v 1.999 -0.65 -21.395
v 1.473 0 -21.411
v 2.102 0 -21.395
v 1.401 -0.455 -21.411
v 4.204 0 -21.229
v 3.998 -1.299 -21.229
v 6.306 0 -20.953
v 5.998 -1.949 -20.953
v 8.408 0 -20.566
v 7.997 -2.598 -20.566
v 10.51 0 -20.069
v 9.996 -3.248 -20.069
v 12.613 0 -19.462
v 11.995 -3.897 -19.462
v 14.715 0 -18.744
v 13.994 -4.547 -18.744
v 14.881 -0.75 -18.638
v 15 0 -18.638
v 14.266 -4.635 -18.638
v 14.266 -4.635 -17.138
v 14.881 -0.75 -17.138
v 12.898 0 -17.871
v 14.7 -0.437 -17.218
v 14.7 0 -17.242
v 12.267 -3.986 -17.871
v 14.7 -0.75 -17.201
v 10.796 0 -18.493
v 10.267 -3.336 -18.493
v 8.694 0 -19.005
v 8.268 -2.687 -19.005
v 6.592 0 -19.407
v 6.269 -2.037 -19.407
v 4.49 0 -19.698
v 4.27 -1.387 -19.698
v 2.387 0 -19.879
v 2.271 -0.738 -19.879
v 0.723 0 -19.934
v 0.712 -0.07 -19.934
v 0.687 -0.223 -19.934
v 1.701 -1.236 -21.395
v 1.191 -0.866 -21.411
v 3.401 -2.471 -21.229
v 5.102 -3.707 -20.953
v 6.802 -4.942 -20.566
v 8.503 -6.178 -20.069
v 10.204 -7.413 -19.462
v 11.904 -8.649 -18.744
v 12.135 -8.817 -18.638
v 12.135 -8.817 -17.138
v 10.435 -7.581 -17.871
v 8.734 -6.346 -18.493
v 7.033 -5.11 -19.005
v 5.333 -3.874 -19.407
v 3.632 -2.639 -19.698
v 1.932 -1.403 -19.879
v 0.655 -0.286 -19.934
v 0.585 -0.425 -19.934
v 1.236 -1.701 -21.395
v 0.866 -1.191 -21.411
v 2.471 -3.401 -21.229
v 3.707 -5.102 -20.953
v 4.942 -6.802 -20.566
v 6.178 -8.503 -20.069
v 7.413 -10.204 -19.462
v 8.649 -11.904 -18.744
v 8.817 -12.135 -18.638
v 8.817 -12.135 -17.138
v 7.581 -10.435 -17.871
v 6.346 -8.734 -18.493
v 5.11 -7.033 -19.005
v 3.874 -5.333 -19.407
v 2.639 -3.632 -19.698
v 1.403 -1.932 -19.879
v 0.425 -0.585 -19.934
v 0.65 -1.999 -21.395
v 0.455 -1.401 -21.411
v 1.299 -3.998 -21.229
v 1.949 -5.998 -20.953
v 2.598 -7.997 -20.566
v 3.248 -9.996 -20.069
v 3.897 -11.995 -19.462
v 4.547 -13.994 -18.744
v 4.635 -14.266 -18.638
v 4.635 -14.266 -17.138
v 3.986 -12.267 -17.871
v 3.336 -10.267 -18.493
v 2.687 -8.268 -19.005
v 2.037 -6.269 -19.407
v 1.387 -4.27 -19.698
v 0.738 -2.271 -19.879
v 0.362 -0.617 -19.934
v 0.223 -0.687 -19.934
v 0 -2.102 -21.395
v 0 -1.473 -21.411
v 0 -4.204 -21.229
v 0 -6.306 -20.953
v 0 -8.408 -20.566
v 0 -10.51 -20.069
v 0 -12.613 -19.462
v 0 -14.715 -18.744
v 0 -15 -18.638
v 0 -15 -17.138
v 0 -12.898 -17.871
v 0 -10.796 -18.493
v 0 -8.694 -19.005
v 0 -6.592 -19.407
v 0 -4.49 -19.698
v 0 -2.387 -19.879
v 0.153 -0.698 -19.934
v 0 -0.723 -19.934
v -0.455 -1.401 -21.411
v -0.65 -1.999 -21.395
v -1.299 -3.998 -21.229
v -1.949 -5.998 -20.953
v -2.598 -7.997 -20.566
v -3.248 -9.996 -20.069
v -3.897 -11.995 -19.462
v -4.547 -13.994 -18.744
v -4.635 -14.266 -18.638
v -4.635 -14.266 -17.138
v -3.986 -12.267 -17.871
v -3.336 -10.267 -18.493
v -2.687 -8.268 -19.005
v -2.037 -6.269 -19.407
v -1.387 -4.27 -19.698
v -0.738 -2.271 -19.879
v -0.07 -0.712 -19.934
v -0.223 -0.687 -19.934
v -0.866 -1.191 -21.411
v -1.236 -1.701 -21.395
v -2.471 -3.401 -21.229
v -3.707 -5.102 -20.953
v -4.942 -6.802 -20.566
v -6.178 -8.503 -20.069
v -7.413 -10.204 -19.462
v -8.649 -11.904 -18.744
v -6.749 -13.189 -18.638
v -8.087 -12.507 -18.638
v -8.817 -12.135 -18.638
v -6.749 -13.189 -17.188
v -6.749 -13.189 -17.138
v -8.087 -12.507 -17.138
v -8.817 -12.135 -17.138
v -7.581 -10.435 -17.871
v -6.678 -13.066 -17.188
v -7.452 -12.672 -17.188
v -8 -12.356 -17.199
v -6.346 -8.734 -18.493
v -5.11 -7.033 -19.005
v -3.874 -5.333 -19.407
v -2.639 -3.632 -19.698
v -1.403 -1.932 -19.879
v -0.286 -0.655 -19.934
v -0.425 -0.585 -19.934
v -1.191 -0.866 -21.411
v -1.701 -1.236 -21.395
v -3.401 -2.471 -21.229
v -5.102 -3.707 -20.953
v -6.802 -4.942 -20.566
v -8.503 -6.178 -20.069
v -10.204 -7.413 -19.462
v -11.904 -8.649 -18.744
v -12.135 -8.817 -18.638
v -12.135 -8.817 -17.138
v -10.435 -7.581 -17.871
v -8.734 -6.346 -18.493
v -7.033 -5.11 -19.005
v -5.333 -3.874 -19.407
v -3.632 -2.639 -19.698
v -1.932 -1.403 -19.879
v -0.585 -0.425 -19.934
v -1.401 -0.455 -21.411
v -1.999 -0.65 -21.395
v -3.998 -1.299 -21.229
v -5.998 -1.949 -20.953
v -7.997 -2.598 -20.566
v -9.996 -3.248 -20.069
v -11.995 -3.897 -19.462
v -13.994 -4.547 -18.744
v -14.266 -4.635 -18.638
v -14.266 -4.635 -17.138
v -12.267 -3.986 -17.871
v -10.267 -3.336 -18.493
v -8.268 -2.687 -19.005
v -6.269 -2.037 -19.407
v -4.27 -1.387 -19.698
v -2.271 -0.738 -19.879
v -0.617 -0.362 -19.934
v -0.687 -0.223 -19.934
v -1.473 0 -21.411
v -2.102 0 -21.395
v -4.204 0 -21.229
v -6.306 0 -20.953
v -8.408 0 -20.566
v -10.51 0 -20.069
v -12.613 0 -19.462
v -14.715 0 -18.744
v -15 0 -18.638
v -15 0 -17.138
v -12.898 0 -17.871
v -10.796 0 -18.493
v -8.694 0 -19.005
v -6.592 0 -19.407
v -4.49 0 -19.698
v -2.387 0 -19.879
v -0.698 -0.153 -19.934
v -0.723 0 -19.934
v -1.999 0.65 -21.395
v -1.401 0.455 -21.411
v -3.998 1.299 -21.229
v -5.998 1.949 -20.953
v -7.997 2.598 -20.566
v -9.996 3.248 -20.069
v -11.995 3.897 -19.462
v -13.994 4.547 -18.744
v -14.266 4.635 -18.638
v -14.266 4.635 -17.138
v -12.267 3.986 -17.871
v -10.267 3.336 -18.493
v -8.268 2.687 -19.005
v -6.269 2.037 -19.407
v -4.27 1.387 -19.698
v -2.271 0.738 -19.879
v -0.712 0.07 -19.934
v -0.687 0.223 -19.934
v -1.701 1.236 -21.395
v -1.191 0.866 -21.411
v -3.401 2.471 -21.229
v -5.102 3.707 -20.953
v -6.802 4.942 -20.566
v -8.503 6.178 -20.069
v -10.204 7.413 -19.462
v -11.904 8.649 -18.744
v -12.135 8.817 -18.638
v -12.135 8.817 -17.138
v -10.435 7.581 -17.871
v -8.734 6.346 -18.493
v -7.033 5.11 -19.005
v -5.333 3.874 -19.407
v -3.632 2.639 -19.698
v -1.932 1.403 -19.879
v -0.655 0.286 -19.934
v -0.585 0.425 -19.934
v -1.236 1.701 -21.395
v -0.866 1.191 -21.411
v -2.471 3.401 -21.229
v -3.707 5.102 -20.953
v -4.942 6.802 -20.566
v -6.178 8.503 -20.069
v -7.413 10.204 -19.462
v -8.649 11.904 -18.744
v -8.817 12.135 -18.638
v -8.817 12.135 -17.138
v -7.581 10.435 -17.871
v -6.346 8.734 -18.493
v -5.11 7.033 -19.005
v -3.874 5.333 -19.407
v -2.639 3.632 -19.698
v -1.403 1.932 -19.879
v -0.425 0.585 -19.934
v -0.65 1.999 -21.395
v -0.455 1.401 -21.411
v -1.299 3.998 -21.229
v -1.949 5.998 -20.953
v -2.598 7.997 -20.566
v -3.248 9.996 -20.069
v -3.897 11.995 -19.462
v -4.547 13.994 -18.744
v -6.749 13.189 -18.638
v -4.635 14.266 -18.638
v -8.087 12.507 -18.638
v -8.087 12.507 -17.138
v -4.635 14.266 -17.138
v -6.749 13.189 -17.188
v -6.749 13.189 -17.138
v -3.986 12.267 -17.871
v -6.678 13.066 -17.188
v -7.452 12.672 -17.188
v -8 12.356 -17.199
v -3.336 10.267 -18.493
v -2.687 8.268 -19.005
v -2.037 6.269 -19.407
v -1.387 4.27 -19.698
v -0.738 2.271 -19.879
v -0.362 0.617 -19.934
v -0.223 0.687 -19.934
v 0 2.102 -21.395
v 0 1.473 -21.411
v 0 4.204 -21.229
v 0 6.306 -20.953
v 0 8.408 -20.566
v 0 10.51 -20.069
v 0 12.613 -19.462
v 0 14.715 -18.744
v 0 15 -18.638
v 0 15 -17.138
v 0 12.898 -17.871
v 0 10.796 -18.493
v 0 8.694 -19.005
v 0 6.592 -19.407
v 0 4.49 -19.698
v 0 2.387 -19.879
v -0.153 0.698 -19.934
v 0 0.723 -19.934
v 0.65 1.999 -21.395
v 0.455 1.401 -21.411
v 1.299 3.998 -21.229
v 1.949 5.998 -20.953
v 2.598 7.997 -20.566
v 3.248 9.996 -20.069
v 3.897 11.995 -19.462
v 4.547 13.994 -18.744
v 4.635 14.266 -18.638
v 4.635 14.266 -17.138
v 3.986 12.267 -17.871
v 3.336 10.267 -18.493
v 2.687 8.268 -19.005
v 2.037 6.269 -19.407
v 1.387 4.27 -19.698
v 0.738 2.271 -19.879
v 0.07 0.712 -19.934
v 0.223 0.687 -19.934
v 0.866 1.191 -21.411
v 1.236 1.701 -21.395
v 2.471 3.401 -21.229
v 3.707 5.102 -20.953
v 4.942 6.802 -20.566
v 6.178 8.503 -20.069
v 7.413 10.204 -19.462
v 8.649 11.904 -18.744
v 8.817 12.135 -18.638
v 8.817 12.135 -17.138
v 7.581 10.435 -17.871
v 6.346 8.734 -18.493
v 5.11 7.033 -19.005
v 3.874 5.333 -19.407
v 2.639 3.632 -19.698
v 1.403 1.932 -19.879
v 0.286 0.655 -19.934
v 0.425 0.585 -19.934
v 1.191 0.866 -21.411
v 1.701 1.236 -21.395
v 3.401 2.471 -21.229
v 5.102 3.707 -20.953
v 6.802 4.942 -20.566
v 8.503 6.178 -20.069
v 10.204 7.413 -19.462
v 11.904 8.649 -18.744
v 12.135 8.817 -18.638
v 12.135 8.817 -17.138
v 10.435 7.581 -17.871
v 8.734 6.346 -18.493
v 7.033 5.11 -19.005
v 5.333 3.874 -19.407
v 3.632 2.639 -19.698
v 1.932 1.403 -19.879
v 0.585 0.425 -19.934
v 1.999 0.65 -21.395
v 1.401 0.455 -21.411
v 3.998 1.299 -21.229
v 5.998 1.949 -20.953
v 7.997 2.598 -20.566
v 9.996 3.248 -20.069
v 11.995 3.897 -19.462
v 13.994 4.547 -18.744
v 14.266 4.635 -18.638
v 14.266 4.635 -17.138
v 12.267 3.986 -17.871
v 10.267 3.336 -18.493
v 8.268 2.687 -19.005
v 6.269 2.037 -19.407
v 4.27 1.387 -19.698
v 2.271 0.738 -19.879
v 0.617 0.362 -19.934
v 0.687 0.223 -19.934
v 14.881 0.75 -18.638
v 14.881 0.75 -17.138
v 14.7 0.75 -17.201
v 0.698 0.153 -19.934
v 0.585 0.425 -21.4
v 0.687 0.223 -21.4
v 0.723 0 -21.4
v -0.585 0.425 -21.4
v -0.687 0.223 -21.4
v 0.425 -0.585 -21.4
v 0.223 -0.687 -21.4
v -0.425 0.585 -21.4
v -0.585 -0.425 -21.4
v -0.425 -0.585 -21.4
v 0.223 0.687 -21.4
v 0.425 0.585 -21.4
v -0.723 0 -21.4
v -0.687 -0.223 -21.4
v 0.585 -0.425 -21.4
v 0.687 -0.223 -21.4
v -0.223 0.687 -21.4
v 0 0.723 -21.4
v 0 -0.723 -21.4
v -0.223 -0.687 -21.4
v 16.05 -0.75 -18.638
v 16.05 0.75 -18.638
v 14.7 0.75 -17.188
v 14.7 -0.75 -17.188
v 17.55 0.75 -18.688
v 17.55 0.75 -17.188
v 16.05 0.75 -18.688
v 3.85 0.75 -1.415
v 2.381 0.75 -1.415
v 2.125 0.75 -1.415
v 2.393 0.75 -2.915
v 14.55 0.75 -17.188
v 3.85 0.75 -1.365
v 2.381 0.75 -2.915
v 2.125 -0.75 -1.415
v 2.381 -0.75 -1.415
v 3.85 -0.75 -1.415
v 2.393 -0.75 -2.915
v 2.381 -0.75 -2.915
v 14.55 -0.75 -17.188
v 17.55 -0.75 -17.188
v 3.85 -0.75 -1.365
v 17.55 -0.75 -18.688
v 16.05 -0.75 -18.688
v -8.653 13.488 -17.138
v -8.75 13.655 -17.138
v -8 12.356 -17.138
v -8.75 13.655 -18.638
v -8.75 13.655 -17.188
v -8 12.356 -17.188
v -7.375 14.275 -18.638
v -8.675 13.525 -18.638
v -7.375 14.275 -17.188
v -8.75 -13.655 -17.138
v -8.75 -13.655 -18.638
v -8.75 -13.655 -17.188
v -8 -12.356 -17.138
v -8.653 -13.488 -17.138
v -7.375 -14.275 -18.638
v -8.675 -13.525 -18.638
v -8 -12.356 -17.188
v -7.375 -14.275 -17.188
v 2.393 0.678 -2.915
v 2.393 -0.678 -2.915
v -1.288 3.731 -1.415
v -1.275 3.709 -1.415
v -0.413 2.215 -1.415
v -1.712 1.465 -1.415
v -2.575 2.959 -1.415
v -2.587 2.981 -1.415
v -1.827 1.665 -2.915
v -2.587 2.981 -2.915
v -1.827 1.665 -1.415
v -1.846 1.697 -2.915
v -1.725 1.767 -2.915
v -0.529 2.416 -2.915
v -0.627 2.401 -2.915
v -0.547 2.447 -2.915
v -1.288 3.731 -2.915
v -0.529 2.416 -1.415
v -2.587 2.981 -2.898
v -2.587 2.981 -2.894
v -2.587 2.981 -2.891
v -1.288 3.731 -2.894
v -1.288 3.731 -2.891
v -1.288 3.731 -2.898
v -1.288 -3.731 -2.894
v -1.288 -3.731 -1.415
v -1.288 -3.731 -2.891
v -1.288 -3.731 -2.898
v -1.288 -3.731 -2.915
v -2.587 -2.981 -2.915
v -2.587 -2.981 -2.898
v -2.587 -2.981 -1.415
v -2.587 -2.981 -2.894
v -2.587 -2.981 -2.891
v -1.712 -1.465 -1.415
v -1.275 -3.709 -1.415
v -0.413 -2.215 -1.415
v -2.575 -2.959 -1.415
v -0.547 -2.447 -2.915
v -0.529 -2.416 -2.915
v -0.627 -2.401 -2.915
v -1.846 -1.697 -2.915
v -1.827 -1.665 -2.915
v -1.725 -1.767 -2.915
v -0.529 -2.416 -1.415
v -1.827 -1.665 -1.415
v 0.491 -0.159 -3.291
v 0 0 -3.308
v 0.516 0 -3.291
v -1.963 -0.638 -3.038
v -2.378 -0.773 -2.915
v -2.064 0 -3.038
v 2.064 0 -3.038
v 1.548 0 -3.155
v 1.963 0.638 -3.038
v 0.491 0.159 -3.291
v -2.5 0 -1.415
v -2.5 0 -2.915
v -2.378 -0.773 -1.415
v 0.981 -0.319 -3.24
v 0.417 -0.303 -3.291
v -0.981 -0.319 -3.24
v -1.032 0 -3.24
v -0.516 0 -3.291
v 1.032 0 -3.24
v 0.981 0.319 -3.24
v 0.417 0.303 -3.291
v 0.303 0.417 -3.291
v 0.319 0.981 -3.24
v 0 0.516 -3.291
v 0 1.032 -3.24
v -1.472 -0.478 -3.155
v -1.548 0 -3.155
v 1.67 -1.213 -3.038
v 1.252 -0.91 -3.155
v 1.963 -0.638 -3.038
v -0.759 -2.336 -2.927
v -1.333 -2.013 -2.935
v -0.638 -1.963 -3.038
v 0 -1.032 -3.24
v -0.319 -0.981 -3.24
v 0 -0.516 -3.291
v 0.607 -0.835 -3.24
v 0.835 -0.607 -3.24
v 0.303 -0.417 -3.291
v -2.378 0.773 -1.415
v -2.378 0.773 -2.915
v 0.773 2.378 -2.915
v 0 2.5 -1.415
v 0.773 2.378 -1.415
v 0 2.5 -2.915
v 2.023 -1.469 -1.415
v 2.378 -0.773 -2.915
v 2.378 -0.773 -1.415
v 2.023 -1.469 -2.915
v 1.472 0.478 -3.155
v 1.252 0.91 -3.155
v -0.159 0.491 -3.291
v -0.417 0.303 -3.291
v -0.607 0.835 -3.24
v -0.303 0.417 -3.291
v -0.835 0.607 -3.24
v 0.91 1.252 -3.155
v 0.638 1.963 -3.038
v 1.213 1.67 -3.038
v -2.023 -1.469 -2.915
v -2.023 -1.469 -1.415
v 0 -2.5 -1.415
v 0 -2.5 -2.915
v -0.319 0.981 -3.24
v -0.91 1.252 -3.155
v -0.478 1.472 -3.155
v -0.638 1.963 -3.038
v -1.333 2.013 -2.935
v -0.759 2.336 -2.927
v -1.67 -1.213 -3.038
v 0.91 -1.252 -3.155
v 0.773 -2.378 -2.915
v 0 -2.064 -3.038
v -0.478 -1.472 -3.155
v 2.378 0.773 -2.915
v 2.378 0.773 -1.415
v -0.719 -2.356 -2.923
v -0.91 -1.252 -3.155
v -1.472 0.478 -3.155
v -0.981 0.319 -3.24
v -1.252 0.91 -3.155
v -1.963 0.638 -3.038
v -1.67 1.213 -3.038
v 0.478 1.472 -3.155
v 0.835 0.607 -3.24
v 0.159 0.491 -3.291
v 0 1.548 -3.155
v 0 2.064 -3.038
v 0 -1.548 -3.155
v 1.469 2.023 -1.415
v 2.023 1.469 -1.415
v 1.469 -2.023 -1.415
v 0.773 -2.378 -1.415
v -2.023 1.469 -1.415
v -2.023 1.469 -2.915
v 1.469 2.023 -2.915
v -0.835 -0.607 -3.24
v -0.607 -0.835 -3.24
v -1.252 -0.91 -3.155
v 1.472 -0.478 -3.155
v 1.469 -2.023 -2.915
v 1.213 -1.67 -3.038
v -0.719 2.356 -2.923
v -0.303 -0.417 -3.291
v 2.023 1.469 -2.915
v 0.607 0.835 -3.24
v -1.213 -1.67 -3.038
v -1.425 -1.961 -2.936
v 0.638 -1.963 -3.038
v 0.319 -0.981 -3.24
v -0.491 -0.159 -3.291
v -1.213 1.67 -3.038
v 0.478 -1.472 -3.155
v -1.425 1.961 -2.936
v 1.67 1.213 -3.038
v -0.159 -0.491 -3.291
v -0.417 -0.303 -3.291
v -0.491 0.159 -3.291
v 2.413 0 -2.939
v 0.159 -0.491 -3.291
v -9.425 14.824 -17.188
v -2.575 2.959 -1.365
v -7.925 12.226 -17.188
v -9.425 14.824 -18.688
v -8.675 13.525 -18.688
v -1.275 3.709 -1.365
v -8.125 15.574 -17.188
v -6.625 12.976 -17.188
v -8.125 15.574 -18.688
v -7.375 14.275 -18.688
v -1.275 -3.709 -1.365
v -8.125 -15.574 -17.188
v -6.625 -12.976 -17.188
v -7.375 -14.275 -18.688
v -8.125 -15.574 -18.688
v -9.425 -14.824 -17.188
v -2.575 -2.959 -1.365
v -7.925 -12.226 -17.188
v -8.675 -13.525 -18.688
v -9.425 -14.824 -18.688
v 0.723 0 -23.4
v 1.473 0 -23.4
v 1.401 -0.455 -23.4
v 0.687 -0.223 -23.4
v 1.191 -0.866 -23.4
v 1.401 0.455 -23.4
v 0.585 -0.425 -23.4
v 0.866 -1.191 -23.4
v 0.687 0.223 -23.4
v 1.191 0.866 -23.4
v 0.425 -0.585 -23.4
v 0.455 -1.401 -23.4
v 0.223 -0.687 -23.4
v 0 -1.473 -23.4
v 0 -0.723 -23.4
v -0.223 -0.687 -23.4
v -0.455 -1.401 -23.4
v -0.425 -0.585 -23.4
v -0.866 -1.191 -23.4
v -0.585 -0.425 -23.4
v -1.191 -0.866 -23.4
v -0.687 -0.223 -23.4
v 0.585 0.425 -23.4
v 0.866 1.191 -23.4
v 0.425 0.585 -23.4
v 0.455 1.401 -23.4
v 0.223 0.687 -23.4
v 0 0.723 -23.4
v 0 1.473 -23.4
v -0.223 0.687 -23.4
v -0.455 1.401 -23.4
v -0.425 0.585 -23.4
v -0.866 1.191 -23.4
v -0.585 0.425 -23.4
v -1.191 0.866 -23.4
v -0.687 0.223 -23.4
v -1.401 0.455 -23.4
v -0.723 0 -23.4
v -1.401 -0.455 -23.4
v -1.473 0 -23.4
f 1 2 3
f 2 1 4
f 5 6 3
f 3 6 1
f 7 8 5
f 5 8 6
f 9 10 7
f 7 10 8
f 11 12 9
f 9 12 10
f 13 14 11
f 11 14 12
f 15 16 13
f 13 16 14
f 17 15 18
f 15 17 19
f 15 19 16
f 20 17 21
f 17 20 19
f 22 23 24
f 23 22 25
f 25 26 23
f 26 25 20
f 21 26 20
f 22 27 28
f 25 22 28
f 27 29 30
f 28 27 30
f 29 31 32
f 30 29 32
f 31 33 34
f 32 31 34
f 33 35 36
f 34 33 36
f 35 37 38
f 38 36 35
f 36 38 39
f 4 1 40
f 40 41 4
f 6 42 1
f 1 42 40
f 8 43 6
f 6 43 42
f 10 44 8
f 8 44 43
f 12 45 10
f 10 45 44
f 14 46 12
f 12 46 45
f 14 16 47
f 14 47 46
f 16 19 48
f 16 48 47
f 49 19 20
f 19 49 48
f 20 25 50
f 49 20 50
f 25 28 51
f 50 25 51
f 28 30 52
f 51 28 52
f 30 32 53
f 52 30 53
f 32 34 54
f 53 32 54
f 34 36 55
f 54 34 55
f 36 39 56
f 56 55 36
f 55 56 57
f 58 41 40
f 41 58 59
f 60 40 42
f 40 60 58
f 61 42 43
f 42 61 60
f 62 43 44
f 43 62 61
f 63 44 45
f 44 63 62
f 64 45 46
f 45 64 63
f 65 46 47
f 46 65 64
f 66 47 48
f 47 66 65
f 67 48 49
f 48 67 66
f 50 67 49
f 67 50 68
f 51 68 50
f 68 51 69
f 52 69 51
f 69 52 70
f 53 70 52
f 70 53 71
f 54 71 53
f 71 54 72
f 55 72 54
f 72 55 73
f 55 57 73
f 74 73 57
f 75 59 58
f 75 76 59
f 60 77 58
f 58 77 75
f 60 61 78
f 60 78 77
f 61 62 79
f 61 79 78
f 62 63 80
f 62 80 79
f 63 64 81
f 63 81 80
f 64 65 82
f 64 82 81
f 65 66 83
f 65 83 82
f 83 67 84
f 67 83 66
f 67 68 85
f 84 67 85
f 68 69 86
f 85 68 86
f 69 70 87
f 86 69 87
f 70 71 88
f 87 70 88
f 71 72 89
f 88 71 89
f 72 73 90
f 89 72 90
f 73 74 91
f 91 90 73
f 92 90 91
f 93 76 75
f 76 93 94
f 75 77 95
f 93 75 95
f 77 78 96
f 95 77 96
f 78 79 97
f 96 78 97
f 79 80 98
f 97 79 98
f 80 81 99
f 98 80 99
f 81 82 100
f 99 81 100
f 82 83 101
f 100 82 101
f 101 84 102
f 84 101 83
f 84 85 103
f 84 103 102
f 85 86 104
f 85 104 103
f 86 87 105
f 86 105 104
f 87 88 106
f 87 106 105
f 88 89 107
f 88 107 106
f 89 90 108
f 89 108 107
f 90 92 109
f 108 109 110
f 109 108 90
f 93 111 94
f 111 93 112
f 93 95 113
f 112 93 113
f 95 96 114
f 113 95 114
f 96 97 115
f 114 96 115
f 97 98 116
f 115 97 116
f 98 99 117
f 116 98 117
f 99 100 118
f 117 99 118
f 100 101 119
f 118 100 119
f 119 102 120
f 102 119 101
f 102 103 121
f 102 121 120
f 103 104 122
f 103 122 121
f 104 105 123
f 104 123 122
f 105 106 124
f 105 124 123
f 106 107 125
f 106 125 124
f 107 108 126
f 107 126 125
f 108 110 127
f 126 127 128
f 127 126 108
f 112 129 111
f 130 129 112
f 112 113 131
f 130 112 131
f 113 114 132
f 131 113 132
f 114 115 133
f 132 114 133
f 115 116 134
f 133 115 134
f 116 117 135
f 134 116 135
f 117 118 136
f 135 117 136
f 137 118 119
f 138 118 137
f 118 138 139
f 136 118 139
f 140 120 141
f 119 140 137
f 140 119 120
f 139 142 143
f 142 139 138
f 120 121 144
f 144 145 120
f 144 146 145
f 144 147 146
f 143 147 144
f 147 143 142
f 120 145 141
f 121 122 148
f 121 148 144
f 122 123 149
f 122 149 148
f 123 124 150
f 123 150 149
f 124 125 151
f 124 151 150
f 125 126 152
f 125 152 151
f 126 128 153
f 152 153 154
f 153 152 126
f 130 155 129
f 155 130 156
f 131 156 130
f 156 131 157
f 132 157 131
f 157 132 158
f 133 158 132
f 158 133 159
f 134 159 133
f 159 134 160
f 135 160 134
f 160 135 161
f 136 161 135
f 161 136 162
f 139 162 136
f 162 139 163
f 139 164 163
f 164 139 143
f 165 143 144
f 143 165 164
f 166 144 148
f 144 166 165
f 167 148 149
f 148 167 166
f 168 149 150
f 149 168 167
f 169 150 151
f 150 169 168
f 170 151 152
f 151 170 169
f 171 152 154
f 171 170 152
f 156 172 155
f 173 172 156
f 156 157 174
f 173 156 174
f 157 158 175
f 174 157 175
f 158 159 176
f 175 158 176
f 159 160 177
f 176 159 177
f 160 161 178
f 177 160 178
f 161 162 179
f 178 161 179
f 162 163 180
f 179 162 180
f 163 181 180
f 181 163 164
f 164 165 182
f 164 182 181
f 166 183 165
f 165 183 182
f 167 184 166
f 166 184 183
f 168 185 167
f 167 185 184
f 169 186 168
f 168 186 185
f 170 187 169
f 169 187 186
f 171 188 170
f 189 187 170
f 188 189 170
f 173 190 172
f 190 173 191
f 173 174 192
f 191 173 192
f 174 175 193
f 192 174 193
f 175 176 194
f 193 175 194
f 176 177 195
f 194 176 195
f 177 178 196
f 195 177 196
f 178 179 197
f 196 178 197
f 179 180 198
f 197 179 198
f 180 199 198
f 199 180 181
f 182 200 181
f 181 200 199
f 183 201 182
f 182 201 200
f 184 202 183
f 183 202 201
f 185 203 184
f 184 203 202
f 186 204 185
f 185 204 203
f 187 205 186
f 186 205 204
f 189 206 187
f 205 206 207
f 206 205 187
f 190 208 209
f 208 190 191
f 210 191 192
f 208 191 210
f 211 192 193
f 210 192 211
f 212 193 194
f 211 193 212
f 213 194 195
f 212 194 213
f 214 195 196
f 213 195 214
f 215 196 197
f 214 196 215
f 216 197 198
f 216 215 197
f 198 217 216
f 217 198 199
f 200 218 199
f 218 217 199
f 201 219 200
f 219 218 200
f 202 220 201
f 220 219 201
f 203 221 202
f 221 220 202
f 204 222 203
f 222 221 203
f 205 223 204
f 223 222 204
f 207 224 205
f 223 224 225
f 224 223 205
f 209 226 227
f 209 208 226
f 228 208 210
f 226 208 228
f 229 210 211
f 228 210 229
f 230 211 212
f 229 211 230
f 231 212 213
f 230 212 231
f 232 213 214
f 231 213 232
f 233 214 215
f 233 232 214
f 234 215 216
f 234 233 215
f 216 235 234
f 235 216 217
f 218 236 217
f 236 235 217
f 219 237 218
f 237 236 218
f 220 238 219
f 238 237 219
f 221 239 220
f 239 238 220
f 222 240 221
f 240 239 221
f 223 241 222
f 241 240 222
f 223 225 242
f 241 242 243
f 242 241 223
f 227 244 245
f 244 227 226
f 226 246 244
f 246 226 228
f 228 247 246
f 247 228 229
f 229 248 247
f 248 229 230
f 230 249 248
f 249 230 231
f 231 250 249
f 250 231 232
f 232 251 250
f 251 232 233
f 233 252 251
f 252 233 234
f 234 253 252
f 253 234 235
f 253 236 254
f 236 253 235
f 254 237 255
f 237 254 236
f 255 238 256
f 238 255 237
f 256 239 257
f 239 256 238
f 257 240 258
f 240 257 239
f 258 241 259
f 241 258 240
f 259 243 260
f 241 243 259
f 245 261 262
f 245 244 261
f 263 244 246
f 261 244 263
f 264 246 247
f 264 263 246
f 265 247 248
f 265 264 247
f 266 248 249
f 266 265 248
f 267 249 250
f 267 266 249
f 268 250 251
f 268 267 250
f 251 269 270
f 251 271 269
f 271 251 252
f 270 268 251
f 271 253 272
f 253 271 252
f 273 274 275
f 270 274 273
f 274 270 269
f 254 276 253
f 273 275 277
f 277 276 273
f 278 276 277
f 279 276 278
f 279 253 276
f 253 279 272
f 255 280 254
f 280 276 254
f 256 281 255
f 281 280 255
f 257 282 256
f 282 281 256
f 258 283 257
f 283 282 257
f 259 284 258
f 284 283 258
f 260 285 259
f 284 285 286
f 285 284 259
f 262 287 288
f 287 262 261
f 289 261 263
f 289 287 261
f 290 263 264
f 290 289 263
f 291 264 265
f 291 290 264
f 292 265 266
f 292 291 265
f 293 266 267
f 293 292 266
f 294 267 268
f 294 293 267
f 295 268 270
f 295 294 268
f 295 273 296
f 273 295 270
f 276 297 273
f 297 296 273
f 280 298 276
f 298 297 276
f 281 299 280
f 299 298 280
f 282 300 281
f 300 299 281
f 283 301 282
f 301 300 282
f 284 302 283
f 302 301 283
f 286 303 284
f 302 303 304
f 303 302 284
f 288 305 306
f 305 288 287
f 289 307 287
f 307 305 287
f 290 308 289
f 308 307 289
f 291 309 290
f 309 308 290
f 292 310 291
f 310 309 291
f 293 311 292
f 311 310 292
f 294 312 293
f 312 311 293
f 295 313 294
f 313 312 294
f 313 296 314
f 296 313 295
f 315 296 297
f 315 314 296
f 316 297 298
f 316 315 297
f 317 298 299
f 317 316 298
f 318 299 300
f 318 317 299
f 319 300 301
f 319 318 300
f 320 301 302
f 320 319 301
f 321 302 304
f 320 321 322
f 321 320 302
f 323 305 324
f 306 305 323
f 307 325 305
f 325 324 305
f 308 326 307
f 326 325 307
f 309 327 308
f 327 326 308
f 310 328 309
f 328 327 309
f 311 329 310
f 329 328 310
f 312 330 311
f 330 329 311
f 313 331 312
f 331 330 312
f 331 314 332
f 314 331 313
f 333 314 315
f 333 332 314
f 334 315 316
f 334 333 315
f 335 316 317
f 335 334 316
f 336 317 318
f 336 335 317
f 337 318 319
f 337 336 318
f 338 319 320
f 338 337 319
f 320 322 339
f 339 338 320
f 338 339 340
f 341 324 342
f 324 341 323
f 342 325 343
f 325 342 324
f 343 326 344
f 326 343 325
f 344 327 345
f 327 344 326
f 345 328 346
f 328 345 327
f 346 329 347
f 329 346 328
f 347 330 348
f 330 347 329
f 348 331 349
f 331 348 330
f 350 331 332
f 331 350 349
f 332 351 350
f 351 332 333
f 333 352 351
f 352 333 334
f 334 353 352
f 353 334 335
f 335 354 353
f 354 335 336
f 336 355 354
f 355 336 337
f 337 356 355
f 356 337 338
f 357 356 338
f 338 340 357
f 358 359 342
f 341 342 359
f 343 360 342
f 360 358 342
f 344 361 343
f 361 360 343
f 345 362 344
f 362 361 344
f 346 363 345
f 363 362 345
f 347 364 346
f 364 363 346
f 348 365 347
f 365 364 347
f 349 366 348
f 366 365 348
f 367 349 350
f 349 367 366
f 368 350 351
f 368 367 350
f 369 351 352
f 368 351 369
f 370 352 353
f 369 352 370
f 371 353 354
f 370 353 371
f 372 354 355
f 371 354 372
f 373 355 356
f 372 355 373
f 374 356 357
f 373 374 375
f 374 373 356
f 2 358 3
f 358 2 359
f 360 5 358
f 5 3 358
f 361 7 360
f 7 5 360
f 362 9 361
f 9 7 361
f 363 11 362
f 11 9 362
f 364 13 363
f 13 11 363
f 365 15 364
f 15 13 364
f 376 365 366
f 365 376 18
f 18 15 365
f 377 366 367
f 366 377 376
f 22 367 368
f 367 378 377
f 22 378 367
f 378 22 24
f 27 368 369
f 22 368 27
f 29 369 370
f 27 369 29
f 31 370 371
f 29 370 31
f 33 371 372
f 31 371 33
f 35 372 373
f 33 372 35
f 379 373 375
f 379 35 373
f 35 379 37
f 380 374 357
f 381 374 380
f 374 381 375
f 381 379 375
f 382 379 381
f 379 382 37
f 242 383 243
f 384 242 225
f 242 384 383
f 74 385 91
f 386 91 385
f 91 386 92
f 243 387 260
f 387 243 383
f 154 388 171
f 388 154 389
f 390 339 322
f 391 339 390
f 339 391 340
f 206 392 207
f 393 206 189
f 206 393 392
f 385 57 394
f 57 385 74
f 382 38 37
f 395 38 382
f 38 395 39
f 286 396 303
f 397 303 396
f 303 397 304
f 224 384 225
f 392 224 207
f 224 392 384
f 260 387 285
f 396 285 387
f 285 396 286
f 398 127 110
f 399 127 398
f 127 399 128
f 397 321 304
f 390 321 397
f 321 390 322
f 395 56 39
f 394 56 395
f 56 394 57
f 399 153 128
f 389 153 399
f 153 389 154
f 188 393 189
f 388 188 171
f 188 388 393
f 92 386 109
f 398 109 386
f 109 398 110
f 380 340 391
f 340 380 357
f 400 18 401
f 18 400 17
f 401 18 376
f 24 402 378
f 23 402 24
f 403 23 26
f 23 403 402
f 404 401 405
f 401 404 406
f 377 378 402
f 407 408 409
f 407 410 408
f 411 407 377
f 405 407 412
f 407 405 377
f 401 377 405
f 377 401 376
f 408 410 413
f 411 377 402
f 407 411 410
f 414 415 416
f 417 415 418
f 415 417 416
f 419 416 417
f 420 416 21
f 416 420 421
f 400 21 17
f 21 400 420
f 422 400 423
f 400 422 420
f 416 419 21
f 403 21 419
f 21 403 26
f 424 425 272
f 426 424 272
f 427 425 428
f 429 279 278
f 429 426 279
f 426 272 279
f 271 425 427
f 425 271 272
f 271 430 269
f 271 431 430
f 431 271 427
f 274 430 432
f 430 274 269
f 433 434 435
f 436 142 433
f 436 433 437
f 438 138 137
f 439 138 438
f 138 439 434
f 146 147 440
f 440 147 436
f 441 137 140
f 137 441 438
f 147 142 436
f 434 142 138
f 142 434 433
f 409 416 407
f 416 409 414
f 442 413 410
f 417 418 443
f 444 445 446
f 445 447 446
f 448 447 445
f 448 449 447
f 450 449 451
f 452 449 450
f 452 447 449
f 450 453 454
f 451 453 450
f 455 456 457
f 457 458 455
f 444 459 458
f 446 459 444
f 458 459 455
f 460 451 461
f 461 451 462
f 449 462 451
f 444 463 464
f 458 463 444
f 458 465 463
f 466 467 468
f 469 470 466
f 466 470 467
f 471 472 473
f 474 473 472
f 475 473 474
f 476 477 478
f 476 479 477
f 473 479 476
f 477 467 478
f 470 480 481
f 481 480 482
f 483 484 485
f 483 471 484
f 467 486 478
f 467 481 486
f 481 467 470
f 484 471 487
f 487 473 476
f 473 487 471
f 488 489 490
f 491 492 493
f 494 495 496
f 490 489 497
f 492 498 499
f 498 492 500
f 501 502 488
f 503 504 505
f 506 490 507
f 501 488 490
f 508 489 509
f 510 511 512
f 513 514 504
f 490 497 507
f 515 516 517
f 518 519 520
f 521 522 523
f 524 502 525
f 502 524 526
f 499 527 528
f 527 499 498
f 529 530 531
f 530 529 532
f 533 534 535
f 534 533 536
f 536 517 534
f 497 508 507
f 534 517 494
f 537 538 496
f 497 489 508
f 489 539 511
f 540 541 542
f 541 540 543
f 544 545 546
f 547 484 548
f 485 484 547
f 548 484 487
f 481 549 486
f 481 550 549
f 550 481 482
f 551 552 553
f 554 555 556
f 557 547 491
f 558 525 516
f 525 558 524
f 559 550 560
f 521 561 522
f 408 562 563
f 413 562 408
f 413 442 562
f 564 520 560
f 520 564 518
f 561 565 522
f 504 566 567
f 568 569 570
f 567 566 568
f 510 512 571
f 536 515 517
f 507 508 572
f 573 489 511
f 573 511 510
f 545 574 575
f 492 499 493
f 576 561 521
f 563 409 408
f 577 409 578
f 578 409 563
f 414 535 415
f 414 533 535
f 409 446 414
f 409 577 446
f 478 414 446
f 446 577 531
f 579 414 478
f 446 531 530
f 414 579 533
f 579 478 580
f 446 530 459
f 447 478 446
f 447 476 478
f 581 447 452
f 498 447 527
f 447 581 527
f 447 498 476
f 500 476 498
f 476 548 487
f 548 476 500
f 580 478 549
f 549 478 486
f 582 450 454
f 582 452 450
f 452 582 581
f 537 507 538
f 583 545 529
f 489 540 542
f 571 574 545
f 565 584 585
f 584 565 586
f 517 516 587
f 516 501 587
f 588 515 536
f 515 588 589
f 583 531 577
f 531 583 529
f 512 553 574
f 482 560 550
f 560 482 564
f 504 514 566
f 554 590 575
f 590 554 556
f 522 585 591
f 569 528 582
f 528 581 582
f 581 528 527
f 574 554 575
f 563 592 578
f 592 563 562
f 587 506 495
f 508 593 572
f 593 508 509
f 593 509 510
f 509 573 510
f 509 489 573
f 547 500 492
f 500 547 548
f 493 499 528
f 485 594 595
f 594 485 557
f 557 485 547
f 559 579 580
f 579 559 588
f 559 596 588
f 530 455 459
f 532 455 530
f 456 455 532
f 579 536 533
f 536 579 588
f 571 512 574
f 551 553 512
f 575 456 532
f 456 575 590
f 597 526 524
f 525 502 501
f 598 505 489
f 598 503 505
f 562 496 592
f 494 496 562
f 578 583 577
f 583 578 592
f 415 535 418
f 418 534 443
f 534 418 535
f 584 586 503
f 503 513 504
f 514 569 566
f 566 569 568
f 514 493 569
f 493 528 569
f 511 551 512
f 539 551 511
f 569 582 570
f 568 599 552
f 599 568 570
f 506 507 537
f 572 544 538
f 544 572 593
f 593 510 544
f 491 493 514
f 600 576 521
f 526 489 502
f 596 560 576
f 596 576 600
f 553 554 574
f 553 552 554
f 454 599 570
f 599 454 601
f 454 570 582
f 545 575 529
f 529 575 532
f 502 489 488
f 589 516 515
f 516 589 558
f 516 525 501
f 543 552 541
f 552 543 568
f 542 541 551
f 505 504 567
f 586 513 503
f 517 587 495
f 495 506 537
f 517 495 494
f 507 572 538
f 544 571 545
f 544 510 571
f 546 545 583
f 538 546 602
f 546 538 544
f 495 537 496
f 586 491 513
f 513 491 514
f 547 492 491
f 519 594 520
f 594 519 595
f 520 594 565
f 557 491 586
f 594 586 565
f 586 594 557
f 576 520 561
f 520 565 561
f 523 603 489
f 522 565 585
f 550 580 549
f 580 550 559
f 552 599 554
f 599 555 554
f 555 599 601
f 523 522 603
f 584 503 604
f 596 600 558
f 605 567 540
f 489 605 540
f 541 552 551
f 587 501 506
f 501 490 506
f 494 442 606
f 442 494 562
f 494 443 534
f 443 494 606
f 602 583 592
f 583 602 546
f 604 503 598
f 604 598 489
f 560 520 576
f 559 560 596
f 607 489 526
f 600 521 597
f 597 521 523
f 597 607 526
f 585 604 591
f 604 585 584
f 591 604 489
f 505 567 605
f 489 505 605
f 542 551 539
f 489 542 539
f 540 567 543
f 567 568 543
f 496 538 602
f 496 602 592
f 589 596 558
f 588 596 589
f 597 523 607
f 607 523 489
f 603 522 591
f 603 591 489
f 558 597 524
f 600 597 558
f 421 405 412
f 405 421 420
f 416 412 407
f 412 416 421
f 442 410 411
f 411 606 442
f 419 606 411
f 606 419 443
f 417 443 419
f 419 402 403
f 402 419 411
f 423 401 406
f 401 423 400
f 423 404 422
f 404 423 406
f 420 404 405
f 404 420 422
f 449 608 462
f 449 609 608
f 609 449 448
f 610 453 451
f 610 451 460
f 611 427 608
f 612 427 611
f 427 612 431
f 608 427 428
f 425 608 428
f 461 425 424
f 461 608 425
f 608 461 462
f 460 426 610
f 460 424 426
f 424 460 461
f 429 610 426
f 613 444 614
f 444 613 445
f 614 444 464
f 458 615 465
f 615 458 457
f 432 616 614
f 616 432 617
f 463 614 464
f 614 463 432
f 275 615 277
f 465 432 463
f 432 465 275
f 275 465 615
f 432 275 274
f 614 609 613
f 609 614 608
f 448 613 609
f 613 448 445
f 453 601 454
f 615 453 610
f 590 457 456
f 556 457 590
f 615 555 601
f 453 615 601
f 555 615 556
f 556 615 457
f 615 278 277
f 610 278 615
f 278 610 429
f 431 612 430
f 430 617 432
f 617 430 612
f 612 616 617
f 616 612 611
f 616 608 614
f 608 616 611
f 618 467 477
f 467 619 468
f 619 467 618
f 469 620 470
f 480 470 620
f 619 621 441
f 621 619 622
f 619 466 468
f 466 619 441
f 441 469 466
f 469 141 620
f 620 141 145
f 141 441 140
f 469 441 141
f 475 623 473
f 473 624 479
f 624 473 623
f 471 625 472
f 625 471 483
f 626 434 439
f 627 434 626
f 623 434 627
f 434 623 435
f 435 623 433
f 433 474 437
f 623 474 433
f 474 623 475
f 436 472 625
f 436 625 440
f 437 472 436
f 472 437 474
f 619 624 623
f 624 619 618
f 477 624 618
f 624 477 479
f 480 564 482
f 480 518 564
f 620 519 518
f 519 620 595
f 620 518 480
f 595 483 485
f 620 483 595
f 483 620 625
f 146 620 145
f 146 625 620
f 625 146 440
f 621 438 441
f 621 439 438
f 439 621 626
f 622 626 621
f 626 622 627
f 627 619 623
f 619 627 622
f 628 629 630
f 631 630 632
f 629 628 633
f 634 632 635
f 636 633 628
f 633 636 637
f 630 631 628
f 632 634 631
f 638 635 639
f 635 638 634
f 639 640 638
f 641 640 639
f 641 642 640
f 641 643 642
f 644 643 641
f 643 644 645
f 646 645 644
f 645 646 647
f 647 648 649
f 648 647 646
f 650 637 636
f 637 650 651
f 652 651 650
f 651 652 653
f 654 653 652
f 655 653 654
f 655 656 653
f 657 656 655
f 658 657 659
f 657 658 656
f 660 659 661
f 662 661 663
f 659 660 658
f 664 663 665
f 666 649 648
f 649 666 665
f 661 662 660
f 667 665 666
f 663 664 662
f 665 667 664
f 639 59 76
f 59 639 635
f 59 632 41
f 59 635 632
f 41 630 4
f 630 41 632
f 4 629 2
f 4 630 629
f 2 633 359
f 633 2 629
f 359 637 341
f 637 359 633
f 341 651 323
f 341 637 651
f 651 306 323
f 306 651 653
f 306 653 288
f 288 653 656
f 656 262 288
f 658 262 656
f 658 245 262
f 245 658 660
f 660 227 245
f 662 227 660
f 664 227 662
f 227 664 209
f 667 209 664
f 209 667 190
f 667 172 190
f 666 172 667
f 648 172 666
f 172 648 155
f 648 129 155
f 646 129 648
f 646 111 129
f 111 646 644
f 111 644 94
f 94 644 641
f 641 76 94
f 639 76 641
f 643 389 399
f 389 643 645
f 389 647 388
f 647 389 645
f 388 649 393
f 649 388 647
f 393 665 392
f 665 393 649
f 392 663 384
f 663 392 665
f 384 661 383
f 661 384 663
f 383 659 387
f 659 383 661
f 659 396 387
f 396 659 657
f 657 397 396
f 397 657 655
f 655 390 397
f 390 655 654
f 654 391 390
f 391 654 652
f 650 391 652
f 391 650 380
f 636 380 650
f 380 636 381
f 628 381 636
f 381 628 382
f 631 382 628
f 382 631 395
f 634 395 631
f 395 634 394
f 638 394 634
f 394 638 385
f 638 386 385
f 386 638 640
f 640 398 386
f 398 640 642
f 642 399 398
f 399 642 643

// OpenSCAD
//Cassegrain Dish
//Ari M Diacou
//December 2016

/***************Source***************\
Peter Hannan, "Microwave antennas derived from the cassegrain telescope," in IRE Transactions on Antennas and Propagation, vol. 9, no. 2, pp. 140-153, March 1961.

URL: http://ieeexplore.ieee.org/stamp/stamp.jsp?tp=&arnumber=1144976&isnumber=25737 

http://ieeexplore.ieee.org/document/1144976/
https://sci-hub.cc/10.1109/TAP.1961.1144976
DOI: 10.1109/TAP.1961.1144976 
\************************************/
/*///////////////////////// Instructions //////////////////////////////
This thing creates a customizable Cassegrain Reflector dish. It was created using the equations from the paper by Peter Hannan, "Microwave antennas derived from the cassegrain telescope," in IRE Transactions on Antennas and Propagation, vol. 9, no. 2, pp. 140-153, March 1961.

If you are using customizer, playing with values, use the "mockup" mode. If you want to print it straight (which you should only use if you are using a resin printer or Shapeways or another fused dust printer), then use "solid". "For printing" should be used on a FFF printer (most of you). If using an FFF printer, the pieces are arranged so that they can be printed best on a flat bed. Feel free to rearrange the pieces on your slicer. The STLs provided will work if scaled all by the same amount, but the physics will not work out if you have different scaling for x,y,z.

If printing on an FFF printer, use supports for the dish. Infill doesnt matter as long as there are no holes in your pieces. Once all the pieces are printed, the waveguide gets glueed (I recommend a clear superglue, like cyanoacrylate) to the back of the main reflector. The struts get glued to the main reflector and the secondary reflector. The bulge on the scondary reflector is supposed to point towards the concave part of the main reflector. The spike looking thing is a ruler. You stick the thin end in the hole of the main reflector, and the secondary reflector sits on top of the ruler, so that you know how far apart they are supposed to be. The thin part of the ruler measuers the distance between the reflecting face of the main reflector, and where the focus/sensor/microphone/speaker/lightbulb is supposed to be. Check "mockup" mode if you are unsure how the pieces are supposed to be arranged. The ruler is not to be glued to any pieces. Remove the ruler (I guess by cutting it in half) once you have assembled the struts and secondary reflector.

Theory
Cassegrain reflectors are used in radio telescopes, and are based off of the optical Cassegrain Telescopes. While Cassegrain reflectors will work theoretically with any wave, the physics assumptions that they are designed with assume that the distance between the main and secondary reflectors is more than 3 wavelengths. This can present problems if you are using this for Radio or Sound waves. But, if you know enough physics to want to use a cassegrain reflector as a tool, you can figure out how to calculate the wavelength of the signal you are using (Hint: λ=v/f).

Suggestions for use as a tool:
    ►Stick the waveguide in you ear, see what you can hear.
    ►Glue aluminum foil to the main and secondary reflectors, and use it as a flashlight by putting an LED in the waveguide.
    ►Glue aluminum foil to the main and secondary reflectors, stick a coil of wire in the waveguide, and use it as a radio receiver.
    ►Glue aluminum foil to the main and secondary reflectors, stick an IR photodiode in the waveguide, and use it in photo-communications projects. Bonus points if you mod one of your home entertainment systems to use this!    */

//////////////////////////// Parameters ///////////////////////////////
//is the focal lenth of the main reflector.
focal_main=20;
//is the diameter of the main refector.
diameter_main=30;
//is the distance below the bottom of the reflector that you want the electronics to be (the collector point, or the real focus of the whole system).
x_e=2;
//is the diameter of the secondary reflector.
diameter_secondary=5;
//How do you want your parts arranged?
display_type=2;//[1:Mockup,2:Solid,3:For Printing]
//that support the secondary reflector from the main reflector
number_of_struts=3;//[0,1,2,3,4]
//is the number of segments make up a circle. Higher is smoother, but with larger file size, and longer rendering time. Customizer will fail silently if there are too many facets.
$fn=20;
/*[Hidden]*/
//////////////////////// Derived Parameters ///////////////////////////
//Suggested filename
echo(str("Suggested filename: Cassegrain Dish ",type_string,"-Fm=",focal_main,"Dm=",diameter_main,"Xe=",x_e,"Ds=",diameter_secondary,"Ns=",number_of_struts));
type_string=(display_type==1)?"mockup":((display_type==2)?"solid":"printable");
//epsilon, a small value used to ensure mainfold-ness
ep=0+0.05;
//The thickness of the main reflector, and the added thickness of the secondary reflector
thickness=0.05*diameter_main;
//The angle that the edges of the mirrors make with the virtual focus (
focal_collector=focal_main+x_e+thickness;
phi_v=2*atan(diameter_main/focal_main/4); //Hannan, Eq. 1
//The angle between the boresight axis (z), the real focal point (C, which is x_e behind the main reflector), and the edge of the secondary reflector
phi_r=atan(1/(2*(focal_collector)/diameter_secondary-1/tan(phi_v))); //Hannan, Eq. 2
//The eccentricty of a hyperbola (http://mathworld.wolfram.com/Hyperbola.html, Eq. 9)
e=sin((phi_v+phi_r)/2)/sin((phi_v-phi_r)/2); //Hannan, Eq. 5.e
//In the canonical form of a hyperbola (x/a)^2-(y/b)^2=1, these are the cononical denominators (http://mathworld.wolfram.com/Hyperbola.html, Eq. 7)
a=(focal_collector)/e/2; //Hannan, Eq. 5.a
b=a*sqrt(e*e-1); //Hannan, Eq. 5.b
l_v=(focal_collector)*(1-1/e)/2; //Hannan, Eq. 3
//The highest point on the edge of the secondary dish
x_s_max=x_secondary(diameter_secondary/2);
//The highest point on the edge of the main dish
x_m_max=x_main(diameter_main/2);
//The number of radial steps that make the curve of the main dish,smaller steps means more facets
step_main=focal_main*tan(360/$fn/3);
//The number of radial steps that make the curve of the main dish,smaller steps means more facets
step_secondary=l_v*tan(360/$fn/2);
//echo(str("$fn=",$fn,", phi_v=",phi_v," step_main=",step_main));
//echo(str("$fn=",$fn,", phi_v=",phi_v," step_secondary=",step_secondary));
//The diameter of the hole in the main reflector
hole_diameter=1+1.03*(focal_collector-focal_main)*diameter_secondary/(focal_collector-l_v)/2;
ms_dimensions=[hole_diameter*1.25,min(2,thickness),focal_main-l_v-x_main(hole_diameter*1.25/2)];
mc_dimensions=[hole_diameter/2,min(2,thickness,hole_diameter/2),thickness+x_e+ep];
strut_thickness=thickness;
////////////////////////////// Main() /////////////////////////////////
if(display_type==1){
    color("slategrey") translate([0,0,-focal_main-thickness-ep]) main_mirror();
    color("slategrey") translate([0,0,-l_v+ep]) secondary_mirror();
    #translate([0,0,-l_v]) 
        ruler();
    color("grey") translate([0,0,-focal_main-x_e-thickness-2*ep]) waveguide();
    for(j=[0:number_of_struts-1])
        rotate([90,0,j*360/number_of_struts])
            strut();
    }
else if(display_type==2){
    color("slategrey") 
        translate([0,0,-focal_main-thickness+1*ep])
            main_mirror();
    color("slategrey") 
        translate([0,0,-l_v-1*ep]) 
            secondary_mirror();
    color("grey") 
        translate([0,0,-focal_main-x_e-thickness+2*ep]) 
            waveguide();
    for(j=[0:number_of_struts-1])
        rotate([90,0,j*360/number_of_struts])
            translate([-ep-0.02*diameter_secondary,0,0])
                strut();
    }    
else{
    color("slategrey") 
        translate([0,0,0])
            main_mirror();
    color("slategrey") 
        translate([0,.5*diameter_main+2*strut_thickness+diameter_secondary,thickness]) 
            mirror([0,0,1]) secondary_mirror();
    color("grey") 
        translate(diameter_main*[-.4,.6,0]) 
            waveguide();
    for(j=[0:number_of_struts-1])
        translate([.6*diameter_main+strut_thickness,(2*j+0)*strut_thickness+.7*(focal_main+l_v),0])
            rotate([0,0,-phi_v])
                translate([(3*j+1)*strut_thickness,0,0])
                    strut();
    translate([-.8*diameter_main,-.5*focal_main,0])
        rotate([90,0,0]) 
            ruler();
    }
//////////////////////////// Functions ////////////////////////////////
module strut(){
    A=[diameter_secondary/2,-l_v+x_s_max];
    B=A+[strut_thickness,0];
    C=B+[0,thickness];
    H=[.49*diameter_main,-focal_main+x_m_max];
    D=H+[2*strut_thickness,0];
    E=D+[0,-thickness];
    F=E+[-strut_thickness,0];
    G=(H+D)/2;
    
    strut_points=[A,B,C,D,E,F,G,H]; 
    //echo(struct_points);
    //*for(i=[0:len(struct_points)-1])
    //    translate(struct_points[i])
    //        #text(chr(65+i),size=.6*strut_thickness);
    translate([0,0,-strut_thickness/2])
        linear_extrude(strut_thickness)
            polygon(strut_points);
    }
    
module waveguide(){
    if(x_e>thickness){
        linear_extrude(x_e-0*thickness){
            difference(){
                circle(d=hole_diameter+thickness);
                circle(d=hole_diameter);
                }
            }
        }
    }
module ruler(){
    translate([0,0,-ms_dimensions[2]/2-0*l_v])
        cube(ms_dimensions,center=true);
    translate([0,0,-ms_dimensions[2]-mc_dimensions[2]/2+ep]) 
        cube(mc_dimensions,center=true);
    }
module main_mirror(){
    main_points=concat(
        [for(i=[0:step_main:diameter_main/2])
            [x_main(i),i]
            ]
        ,[[x_m_max,diameter_main/2]]
        ,[for(i=[diameter_main/2:-step_main:0])
            [x_main(i)+thickness,i]
            ]
        ,[[thickness,0]]
        );
    //echo(main_points);
    difference(){
        rotate_extrude()
            rotate(90) 
                polygon(main_points);   
        cylinder(h=thickness*1.1, d=hole_diameter);
        }
    for(i=[0:number_of_struts-1])
        rotate([0,0,i*360/number_of_struts])
            translate([0.49*diameter_main+strut_thickness/2,0,x_m_max+thickness/2])
                cube([strut_thickness,strut_thickness,thickness],center=true);
    }
module secondary_mirror(){
    secondary_points=concat(
        [for(i=[0:step_secondary:diameter_secondary/2])
            [x_secondary(i),i]
            ]
        ,[[x_s_max,diameter_secondary/2],[x_s_max+thickness,diameter_secondary/2],[x_s_max+thickness,0]]
        );
    
    rotate_extrude()
        rotate(90) 
            polygon(secondary_points);
    for(i=[0:number_of_struts-1])
        rotate([0,0,i*360/number_of_struts])
            translate([0.45*diameter_secondary+strut_thickness/2,0,x_s_max+thickness/2])
                cube([0.05*diameter_secondary+strut_thickness,strut_thickness,thickness],center=true);
    }
//height (x) as a function of the radial distance from the center of the main reflector (a parabola). Eq. 4
function x_main(y_main)=y_main*y_main/focal_main/4;
//height (x) as a function of the radial distance from the center of the secondary reflector (a hyperbola). Eq. 5
function x_secondary(y_secondary)=a*(-1+sqrt(1+pow(y_secondary/b,2)));
